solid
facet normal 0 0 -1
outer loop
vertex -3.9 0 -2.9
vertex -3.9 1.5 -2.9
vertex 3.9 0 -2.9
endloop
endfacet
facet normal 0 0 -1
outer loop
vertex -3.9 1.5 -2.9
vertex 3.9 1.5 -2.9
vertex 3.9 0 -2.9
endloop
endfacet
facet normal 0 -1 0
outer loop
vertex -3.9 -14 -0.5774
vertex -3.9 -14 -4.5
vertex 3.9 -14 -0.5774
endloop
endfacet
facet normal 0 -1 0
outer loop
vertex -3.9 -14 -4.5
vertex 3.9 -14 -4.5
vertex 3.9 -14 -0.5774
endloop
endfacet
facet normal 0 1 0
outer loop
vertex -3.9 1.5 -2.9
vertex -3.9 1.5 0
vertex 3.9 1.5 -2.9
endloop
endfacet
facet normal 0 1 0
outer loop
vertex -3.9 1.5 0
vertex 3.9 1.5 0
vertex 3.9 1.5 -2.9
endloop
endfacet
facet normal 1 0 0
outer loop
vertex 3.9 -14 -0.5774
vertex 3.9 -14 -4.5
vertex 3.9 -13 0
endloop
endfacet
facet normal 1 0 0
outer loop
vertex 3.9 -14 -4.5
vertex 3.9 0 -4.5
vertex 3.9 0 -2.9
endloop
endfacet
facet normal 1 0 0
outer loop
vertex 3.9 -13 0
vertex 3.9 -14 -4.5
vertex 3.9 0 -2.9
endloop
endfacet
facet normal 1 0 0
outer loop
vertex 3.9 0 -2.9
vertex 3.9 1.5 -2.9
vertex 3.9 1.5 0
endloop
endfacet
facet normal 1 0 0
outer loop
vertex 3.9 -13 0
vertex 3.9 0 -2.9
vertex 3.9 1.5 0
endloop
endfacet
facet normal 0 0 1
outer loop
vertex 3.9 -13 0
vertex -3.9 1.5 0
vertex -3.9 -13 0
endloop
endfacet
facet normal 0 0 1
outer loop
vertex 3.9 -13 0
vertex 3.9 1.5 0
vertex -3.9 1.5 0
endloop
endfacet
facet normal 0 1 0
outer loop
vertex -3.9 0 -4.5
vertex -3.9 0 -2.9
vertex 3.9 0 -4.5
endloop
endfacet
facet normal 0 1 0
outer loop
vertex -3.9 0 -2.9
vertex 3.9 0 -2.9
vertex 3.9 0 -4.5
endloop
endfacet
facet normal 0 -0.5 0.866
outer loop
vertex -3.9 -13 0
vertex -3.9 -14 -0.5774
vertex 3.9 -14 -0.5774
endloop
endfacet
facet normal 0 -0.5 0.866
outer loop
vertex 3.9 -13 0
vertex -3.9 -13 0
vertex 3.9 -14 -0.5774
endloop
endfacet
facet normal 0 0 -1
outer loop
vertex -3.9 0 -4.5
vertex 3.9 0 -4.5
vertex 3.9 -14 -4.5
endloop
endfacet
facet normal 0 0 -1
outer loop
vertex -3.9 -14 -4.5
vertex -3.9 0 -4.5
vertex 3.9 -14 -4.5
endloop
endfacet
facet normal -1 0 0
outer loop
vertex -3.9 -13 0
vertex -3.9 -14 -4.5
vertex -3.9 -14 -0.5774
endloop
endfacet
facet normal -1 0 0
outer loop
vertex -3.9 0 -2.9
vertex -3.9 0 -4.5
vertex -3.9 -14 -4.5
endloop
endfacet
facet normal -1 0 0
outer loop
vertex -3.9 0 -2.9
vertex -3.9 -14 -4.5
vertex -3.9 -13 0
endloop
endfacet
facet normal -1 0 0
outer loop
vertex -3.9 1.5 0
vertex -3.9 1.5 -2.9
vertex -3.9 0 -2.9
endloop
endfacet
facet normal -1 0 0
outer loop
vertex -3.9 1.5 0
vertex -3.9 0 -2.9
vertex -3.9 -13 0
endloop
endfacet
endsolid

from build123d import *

# Parameters (mm, degrees)
EXTRUDE_1_DEPTH = 3.9
CHAMFER_1_SIZE  = 1
CHAMFER_1_SIZE2 = 0.577350269


with BuildPart() as part:
    # Эскиз1 → Бобышка-Вытянуть1 (new, symmetric)
    with BuildSketch(Plane(origin=(0, 0, 0), x_dir=(0, 0, -1), z_dir=(1, 0, 0))):
        Polygon((0, 0), (0, 1.5), (2.9, 1.5), (2.9, 0), (4.5, 0), (4.5, -14), (0, -14), align=None)
    extrude(amount=EXTRUDE_1_DEPTH, both=True)

    # Фаска1
    chamfer_1_edges = [part.edges().sort_by_distance(p)[0] for p in [
        (0, -14, 0),
    ]]
    chamfer_1_side = [part.faces().sort_by_distance(p)[0] for p in [
        (0, -6.25, 0),
    ]]
    chamfer(chamfer_1_edges, length=CHAMFER_1_SIZE, length2=CHAMFER_1_SIZE2, reference=chamfer_1_side[0])


solid = part.part
